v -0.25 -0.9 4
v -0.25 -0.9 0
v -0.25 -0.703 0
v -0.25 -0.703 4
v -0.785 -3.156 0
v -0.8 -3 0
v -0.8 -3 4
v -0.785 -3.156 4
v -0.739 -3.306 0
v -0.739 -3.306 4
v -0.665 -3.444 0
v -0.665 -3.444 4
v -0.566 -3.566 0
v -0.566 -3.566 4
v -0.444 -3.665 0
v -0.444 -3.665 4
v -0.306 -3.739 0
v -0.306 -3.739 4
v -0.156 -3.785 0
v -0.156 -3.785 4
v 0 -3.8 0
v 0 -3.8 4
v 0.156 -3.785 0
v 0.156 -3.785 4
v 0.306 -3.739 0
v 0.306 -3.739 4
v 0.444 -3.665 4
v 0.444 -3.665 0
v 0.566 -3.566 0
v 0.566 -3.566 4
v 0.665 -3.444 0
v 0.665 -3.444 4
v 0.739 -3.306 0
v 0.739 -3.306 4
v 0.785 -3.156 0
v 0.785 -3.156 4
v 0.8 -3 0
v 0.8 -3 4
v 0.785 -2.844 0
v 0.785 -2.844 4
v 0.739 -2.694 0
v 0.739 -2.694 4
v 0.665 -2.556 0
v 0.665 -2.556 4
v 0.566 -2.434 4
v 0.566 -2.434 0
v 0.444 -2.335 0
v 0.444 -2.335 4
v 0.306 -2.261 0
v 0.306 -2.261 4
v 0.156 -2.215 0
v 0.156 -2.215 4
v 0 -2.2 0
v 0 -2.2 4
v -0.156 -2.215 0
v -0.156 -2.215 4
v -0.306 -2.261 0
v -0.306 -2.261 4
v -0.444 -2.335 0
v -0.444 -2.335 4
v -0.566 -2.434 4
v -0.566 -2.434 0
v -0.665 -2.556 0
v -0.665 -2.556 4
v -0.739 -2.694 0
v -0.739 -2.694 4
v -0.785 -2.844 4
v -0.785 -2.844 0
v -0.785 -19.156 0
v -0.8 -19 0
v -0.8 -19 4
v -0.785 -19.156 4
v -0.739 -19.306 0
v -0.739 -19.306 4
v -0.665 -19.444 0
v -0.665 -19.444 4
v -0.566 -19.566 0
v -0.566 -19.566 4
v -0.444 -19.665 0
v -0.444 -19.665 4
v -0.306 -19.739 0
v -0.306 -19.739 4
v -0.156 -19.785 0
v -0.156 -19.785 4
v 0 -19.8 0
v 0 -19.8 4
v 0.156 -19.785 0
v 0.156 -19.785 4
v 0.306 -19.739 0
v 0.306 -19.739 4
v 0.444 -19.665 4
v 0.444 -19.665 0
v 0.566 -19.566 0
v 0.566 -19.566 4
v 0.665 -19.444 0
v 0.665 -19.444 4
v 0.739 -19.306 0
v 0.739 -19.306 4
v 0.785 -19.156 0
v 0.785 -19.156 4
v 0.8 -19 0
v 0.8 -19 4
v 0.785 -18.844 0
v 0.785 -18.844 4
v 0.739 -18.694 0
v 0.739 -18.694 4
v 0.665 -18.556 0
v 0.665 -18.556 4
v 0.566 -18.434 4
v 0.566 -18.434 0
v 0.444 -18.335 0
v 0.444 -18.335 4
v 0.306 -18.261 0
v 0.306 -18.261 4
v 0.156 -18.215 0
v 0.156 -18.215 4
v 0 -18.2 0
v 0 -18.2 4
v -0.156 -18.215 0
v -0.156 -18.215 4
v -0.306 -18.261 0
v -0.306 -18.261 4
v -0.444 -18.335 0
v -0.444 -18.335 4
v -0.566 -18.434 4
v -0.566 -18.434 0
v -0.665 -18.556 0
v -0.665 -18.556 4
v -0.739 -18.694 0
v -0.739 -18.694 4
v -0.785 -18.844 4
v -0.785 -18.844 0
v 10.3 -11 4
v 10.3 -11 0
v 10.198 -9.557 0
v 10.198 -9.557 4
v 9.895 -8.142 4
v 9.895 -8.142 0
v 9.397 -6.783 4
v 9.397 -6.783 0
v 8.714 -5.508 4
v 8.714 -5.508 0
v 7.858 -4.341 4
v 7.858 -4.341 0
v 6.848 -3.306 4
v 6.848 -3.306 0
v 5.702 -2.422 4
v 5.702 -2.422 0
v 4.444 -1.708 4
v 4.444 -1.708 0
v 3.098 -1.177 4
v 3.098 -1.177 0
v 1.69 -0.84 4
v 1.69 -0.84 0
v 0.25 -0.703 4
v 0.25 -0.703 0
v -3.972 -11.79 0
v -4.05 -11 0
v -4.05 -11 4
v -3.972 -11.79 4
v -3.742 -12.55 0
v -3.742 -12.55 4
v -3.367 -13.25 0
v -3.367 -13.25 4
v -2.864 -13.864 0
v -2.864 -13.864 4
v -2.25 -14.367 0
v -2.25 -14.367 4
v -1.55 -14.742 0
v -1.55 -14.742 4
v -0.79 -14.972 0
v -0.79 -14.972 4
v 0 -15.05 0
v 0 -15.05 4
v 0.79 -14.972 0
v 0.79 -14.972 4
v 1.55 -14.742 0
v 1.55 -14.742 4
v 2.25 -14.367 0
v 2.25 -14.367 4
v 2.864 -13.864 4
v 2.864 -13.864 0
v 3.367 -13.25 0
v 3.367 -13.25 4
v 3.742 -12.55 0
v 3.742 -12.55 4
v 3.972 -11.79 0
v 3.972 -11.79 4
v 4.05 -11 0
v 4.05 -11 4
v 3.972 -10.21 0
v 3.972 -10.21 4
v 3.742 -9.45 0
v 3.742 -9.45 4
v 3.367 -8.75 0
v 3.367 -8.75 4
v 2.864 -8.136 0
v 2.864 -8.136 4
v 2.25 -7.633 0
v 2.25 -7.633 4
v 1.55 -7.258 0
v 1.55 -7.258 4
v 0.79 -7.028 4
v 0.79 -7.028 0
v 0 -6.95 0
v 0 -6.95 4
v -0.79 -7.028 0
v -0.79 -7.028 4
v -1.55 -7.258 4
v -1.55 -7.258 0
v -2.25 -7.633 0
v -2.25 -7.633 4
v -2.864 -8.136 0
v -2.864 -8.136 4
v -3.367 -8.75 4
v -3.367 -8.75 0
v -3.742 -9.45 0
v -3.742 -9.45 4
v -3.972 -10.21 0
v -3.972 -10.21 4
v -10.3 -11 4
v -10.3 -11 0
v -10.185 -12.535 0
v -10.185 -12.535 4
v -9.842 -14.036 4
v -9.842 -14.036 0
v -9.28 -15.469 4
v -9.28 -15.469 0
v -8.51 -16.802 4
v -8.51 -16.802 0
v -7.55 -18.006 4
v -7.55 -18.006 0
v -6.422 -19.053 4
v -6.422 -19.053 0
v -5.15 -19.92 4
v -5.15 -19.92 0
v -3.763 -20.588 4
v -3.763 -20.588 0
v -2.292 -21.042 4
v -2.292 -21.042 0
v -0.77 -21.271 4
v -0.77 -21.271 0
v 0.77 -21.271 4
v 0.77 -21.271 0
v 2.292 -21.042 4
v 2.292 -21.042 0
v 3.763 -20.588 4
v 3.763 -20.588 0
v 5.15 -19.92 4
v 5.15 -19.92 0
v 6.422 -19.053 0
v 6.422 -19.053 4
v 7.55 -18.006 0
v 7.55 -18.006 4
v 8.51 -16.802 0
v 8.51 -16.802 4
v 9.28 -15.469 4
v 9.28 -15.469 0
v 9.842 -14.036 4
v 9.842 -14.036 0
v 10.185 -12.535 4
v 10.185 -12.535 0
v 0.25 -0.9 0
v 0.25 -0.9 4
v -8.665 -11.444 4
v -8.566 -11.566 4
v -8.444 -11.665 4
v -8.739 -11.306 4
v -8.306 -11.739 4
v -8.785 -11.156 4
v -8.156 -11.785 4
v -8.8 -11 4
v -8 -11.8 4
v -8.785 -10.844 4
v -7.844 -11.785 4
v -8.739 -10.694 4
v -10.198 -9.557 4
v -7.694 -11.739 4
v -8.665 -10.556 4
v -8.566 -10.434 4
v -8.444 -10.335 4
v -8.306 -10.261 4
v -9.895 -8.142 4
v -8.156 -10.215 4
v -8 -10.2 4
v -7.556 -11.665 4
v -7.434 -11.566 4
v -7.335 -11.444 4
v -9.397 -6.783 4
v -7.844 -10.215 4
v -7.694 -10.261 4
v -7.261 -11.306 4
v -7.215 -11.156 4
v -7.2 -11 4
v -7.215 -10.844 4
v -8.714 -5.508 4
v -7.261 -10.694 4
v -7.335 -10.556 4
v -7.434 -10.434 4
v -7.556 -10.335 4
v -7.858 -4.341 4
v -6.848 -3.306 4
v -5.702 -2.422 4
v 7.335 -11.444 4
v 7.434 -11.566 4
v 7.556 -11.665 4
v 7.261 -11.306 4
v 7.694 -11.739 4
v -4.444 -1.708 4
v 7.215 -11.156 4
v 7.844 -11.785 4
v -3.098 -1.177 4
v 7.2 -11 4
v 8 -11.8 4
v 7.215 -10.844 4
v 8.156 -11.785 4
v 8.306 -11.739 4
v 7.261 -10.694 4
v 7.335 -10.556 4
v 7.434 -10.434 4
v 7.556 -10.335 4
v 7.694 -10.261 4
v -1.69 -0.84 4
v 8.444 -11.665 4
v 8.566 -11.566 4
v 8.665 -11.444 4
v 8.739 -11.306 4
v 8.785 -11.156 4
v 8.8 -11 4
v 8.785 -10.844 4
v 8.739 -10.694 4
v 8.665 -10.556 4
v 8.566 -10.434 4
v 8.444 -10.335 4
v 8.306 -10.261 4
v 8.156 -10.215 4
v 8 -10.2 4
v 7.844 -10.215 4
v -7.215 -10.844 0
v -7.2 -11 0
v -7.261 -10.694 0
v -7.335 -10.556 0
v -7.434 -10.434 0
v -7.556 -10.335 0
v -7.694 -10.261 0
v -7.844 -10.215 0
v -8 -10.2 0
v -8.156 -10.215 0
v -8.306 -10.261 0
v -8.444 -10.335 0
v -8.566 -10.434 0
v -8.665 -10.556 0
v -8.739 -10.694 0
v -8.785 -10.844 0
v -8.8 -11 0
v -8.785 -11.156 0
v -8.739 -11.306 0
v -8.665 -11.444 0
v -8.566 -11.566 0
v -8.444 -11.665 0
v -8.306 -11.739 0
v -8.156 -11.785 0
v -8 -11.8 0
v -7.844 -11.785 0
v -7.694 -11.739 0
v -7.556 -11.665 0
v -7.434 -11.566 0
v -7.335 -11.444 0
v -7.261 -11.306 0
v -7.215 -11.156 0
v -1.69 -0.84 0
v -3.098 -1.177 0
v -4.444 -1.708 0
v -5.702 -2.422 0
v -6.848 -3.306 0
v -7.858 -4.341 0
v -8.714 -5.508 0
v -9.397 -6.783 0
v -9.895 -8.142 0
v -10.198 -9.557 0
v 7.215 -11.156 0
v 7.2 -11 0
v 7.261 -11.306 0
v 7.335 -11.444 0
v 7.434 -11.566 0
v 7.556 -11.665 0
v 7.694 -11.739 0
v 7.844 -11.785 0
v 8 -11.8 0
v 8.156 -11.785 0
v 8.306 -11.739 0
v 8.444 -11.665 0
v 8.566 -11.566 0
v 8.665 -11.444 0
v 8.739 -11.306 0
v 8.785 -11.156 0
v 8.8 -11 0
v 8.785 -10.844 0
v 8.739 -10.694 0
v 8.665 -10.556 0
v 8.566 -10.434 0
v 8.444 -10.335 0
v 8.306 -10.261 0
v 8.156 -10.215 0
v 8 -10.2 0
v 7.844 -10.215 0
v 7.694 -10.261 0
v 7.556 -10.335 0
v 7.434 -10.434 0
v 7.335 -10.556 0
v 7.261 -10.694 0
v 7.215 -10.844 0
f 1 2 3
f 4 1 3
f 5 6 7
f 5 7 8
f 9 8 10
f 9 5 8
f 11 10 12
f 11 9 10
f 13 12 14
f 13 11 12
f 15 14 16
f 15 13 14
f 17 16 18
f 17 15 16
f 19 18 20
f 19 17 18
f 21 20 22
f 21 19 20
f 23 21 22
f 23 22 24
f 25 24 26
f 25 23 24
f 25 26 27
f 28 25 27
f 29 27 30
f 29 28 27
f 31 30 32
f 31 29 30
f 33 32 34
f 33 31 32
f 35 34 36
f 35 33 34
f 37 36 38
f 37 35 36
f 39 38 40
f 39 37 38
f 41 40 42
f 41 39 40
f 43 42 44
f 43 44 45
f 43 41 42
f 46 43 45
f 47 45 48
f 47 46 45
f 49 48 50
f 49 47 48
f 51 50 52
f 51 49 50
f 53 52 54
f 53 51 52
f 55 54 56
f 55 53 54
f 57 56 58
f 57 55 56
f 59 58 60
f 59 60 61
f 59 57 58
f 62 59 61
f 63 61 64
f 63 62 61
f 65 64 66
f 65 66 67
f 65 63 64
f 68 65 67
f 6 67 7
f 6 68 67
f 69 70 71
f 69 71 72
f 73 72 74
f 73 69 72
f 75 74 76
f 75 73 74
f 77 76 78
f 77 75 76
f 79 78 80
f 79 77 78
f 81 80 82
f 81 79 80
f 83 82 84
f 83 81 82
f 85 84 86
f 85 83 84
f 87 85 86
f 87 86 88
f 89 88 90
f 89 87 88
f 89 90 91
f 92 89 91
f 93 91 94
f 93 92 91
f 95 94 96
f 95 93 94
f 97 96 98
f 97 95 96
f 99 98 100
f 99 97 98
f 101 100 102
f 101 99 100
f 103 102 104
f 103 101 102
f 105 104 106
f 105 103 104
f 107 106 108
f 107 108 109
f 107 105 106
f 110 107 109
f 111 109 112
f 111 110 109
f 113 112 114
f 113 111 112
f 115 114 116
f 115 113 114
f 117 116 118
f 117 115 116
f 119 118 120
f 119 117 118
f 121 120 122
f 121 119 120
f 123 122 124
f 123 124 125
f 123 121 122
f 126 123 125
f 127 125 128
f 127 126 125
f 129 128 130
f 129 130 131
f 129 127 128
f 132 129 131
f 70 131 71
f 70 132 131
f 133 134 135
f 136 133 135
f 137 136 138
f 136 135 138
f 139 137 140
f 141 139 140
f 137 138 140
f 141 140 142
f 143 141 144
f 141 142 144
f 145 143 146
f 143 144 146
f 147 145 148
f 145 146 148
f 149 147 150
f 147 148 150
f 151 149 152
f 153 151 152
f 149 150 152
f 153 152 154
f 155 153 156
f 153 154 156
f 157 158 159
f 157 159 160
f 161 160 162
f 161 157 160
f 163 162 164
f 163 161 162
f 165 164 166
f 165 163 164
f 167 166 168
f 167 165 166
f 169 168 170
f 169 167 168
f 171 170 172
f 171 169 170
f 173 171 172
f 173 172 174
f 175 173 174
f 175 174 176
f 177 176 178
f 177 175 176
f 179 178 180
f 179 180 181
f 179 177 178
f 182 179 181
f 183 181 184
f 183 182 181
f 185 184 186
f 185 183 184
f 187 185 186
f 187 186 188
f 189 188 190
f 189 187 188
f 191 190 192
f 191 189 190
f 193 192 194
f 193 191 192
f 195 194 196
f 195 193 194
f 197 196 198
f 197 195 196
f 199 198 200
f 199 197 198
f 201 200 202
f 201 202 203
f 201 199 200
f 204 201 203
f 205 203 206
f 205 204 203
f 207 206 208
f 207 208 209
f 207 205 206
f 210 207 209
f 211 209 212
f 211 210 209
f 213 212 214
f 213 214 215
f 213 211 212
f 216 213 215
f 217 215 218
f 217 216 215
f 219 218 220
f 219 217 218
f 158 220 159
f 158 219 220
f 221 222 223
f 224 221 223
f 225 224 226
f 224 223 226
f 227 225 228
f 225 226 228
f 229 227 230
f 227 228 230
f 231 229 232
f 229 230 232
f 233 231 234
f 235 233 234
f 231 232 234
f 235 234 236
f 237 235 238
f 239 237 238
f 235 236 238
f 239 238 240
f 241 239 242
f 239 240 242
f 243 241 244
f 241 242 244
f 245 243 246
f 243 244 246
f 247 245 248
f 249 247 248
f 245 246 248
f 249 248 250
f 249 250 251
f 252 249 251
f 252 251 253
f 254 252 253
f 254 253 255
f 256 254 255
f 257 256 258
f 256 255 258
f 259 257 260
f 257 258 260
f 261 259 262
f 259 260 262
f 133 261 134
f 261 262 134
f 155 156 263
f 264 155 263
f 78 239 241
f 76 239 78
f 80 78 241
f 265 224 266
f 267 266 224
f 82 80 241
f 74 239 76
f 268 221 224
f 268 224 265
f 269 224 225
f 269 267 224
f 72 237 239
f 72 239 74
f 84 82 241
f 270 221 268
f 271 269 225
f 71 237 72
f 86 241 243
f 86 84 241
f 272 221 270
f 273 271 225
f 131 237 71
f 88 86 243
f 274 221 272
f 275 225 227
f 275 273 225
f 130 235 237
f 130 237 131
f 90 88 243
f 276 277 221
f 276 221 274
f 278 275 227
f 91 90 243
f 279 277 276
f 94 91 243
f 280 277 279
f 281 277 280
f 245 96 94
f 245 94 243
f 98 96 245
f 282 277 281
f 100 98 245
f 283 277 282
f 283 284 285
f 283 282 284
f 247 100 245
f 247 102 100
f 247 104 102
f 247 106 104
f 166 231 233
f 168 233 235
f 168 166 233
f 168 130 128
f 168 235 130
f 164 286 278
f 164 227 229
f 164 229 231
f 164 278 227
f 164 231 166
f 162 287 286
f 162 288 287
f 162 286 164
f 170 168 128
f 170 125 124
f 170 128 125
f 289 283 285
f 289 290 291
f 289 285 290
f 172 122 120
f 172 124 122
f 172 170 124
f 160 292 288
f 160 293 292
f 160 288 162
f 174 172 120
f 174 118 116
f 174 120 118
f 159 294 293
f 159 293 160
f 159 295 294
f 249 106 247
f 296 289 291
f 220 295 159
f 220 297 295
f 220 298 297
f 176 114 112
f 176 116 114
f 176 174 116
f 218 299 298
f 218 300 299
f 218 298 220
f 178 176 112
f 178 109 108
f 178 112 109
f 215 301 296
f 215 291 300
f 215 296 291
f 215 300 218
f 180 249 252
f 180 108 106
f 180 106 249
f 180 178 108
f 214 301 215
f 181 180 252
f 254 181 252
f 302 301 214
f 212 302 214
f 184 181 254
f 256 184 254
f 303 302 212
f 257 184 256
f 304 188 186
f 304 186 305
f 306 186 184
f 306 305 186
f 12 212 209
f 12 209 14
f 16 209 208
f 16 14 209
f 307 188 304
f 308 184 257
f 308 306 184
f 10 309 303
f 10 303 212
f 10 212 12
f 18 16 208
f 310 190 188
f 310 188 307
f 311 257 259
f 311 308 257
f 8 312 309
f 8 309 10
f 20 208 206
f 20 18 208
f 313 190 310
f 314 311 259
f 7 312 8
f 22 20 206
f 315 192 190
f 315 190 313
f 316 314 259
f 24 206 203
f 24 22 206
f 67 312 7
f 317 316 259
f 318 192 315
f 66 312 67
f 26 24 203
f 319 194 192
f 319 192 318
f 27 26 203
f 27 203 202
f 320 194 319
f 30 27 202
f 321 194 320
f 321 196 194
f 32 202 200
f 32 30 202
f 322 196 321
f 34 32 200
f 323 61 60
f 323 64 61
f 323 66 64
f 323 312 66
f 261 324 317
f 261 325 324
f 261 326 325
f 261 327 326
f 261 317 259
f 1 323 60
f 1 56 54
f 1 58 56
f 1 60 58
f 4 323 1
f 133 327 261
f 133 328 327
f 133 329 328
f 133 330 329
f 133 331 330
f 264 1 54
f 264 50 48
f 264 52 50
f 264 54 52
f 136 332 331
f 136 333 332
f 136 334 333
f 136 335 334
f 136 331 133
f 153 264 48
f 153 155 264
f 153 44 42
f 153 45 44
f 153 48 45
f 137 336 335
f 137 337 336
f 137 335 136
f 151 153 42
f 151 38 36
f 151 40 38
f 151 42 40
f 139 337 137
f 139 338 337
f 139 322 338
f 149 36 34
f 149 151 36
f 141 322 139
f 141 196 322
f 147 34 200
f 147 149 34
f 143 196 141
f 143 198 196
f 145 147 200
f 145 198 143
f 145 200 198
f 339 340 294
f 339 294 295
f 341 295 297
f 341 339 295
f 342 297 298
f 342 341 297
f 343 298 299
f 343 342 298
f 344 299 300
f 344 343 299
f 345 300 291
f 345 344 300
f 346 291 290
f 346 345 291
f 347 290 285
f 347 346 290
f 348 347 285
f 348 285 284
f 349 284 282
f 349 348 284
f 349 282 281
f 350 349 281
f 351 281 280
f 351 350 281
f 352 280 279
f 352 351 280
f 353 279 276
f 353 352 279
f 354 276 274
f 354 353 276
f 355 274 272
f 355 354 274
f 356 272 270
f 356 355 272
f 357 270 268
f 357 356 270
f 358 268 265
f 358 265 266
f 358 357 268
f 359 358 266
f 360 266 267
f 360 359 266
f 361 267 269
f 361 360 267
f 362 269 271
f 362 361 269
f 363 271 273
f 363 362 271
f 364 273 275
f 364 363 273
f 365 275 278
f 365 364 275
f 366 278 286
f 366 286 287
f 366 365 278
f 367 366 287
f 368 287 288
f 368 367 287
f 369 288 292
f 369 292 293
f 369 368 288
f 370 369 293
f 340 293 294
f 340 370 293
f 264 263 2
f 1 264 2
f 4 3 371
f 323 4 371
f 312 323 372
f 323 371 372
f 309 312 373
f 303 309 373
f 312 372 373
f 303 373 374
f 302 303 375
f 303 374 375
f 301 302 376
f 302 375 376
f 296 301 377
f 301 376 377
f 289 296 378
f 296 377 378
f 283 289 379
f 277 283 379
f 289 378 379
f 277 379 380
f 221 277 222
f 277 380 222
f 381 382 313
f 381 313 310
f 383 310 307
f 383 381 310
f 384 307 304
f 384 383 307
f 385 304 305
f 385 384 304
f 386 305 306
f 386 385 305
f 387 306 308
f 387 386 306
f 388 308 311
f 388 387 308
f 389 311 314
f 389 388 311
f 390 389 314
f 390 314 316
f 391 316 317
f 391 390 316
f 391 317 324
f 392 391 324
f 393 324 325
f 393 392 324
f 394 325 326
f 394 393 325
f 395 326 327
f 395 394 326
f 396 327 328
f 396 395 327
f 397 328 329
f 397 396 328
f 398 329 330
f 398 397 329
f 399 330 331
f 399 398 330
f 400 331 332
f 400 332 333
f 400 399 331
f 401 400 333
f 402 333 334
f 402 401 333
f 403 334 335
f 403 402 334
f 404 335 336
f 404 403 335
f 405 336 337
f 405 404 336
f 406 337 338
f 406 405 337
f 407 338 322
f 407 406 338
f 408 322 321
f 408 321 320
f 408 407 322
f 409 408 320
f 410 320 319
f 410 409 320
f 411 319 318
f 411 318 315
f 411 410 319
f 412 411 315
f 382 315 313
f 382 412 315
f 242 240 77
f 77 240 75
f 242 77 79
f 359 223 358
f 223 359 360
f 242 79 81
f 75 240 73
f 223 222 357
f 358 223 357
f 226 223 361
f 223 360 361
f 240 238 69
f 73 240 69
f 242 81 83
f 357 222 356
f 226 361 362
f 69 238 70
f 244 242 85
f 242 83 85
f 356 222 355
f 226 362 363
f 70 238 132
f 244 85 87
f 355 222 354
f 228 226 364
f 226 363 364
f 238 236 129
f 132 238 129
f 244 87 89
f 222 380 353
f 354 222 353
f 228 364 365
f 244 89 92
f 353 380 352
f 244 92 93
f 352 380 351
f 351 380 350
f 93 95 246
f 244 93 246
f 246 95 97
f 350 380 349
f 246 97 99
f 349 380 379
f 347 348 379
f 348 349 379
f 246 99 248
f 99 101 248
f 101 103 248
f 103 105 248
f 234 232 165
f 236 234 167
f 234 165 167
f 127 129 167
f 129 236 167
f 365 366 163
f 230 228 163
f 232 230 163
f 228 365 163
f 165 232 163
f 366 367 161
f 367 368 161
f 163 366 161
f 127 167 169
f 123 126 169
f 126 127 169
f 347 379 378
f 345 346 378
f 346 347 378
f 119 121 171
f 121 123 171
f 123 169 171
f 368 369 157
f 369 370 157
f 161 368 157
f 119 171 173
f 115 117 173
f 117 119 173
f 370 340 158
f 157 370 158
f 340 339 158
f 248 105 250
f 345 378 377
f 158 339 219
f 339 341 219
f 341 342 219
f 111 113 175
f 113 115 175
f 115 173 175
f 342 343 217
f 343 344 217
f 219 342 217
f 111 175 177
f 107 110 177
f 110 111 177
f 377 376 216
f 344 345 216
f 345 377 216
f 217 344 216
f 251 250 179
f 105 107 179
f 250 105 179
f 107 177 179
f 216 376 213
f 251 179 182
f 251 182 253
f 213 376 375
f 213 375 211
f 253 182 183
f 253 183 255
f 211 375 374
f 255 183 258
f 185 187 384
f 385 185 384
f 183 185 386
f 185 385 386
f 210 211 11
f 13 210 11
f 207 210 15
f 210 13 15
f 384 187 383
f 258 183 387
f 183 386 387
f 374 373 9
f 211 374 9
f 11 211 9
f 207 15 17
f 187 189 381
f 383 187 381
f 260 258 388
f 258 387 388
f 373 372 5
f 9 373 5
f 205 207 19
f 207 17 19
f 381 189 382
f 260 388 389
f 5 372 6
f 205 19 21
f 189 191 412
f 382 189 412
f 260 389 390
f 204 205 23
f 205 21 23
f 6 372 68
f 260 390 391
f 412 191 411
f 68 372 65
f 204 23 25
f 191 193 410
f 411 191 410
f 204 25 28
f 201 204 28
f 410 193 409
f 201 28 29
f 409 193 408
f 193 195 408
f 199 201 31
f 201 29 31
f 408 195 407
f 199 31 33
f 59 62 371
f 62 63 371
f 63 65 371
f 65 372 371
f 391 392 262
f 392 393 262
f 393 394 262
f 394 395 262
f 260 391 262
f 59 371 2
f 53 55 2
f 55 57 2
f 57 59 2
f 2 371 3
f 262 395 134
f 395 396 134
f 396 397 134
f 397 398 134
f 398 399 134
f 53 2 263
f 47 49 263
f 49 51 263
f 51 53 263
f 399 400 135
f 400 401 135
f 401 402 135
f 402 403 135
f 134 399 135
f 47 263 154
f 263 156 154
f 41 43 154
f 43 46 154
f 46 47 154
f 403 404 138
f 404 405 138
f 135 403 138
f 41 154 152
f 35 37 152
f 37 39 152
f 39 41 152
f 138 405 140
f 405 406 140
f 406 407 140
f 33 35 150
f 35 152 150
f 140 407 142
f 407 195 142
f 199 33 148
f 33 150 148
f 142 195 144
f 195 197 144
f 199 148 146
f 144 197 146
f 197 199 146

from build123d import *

# Parameters (mm, degrees)
BOSS_EXTRUDE1_DEPTH = 4


with BuildPart() as part:
    # Sketch2 → Boss-Extrude1 (new body)
    with BuildSketch(Plane.XY):
        with BuildLine():
            Line((-0.25, -0.9), (-0.25, -0.703034428))
            ThreePointArc((-0.25, -0.703034428), (-7.371058269, -3.805731448), (-10.3, -11))
            ThreePointArc((-10.3, -11), (0, -21.3), (10.3, -11))
            ThreePointArc((10.3, -11), (7.371058269, -3.805731448), (0.25, -0.703034428))
            Line((0.25, -0.703034428), (0.25, -0.9))
            Line((0.25, -0.9), (-0.25, -0.9))
        make_face()
        with BuildLine():
            ThreePointArc((-8.8, -11), (-8, -11.8), (-7.2, -11))
            ThreePointArc((-7.2, -11), (-8, -10.2), (-8.8, -11))
        make_face(mode=Mode.SUBTRACT)
        with BuildLine():
            ThreePointArc((0.8, -3), (0, -2.2), (-0.8, -3))
            ThreePointArc((-0.8, -3), (0, -3.8), (0.8, -3))
        make_face(mode=Mode.SUBTRACT)
        with BuildLine():
            ThreePointArc((0.8, -19), (0, -18.2), (-0.8, -19))
            ThreePointArc((-0.8, -19), (0, -19.8), (0.8, -19))
        make_face(mode=Mode.SUBTRACT)
        with BuildLine():
            ThreePointArc((8.8, -11), (8, -10.2), (7.2, -11))
            ThreePointArc((7.2, -11), (8, -11.8), (8.8, -11))
        make_face(mode=Mode.SUBTRACT)
        with BuildLine():
            ThreePointArc((4.05, -11), (0, -6.95), (-4.05, -11))
            ThreePointArc((-4.05, -11), (0, -15.05), (4.05, -11))
        make_face(mode=Mode.SUBTRACT)
    extrude(amount=BOSS_EXTRUDE1_DEPTH)


solid = part.part
